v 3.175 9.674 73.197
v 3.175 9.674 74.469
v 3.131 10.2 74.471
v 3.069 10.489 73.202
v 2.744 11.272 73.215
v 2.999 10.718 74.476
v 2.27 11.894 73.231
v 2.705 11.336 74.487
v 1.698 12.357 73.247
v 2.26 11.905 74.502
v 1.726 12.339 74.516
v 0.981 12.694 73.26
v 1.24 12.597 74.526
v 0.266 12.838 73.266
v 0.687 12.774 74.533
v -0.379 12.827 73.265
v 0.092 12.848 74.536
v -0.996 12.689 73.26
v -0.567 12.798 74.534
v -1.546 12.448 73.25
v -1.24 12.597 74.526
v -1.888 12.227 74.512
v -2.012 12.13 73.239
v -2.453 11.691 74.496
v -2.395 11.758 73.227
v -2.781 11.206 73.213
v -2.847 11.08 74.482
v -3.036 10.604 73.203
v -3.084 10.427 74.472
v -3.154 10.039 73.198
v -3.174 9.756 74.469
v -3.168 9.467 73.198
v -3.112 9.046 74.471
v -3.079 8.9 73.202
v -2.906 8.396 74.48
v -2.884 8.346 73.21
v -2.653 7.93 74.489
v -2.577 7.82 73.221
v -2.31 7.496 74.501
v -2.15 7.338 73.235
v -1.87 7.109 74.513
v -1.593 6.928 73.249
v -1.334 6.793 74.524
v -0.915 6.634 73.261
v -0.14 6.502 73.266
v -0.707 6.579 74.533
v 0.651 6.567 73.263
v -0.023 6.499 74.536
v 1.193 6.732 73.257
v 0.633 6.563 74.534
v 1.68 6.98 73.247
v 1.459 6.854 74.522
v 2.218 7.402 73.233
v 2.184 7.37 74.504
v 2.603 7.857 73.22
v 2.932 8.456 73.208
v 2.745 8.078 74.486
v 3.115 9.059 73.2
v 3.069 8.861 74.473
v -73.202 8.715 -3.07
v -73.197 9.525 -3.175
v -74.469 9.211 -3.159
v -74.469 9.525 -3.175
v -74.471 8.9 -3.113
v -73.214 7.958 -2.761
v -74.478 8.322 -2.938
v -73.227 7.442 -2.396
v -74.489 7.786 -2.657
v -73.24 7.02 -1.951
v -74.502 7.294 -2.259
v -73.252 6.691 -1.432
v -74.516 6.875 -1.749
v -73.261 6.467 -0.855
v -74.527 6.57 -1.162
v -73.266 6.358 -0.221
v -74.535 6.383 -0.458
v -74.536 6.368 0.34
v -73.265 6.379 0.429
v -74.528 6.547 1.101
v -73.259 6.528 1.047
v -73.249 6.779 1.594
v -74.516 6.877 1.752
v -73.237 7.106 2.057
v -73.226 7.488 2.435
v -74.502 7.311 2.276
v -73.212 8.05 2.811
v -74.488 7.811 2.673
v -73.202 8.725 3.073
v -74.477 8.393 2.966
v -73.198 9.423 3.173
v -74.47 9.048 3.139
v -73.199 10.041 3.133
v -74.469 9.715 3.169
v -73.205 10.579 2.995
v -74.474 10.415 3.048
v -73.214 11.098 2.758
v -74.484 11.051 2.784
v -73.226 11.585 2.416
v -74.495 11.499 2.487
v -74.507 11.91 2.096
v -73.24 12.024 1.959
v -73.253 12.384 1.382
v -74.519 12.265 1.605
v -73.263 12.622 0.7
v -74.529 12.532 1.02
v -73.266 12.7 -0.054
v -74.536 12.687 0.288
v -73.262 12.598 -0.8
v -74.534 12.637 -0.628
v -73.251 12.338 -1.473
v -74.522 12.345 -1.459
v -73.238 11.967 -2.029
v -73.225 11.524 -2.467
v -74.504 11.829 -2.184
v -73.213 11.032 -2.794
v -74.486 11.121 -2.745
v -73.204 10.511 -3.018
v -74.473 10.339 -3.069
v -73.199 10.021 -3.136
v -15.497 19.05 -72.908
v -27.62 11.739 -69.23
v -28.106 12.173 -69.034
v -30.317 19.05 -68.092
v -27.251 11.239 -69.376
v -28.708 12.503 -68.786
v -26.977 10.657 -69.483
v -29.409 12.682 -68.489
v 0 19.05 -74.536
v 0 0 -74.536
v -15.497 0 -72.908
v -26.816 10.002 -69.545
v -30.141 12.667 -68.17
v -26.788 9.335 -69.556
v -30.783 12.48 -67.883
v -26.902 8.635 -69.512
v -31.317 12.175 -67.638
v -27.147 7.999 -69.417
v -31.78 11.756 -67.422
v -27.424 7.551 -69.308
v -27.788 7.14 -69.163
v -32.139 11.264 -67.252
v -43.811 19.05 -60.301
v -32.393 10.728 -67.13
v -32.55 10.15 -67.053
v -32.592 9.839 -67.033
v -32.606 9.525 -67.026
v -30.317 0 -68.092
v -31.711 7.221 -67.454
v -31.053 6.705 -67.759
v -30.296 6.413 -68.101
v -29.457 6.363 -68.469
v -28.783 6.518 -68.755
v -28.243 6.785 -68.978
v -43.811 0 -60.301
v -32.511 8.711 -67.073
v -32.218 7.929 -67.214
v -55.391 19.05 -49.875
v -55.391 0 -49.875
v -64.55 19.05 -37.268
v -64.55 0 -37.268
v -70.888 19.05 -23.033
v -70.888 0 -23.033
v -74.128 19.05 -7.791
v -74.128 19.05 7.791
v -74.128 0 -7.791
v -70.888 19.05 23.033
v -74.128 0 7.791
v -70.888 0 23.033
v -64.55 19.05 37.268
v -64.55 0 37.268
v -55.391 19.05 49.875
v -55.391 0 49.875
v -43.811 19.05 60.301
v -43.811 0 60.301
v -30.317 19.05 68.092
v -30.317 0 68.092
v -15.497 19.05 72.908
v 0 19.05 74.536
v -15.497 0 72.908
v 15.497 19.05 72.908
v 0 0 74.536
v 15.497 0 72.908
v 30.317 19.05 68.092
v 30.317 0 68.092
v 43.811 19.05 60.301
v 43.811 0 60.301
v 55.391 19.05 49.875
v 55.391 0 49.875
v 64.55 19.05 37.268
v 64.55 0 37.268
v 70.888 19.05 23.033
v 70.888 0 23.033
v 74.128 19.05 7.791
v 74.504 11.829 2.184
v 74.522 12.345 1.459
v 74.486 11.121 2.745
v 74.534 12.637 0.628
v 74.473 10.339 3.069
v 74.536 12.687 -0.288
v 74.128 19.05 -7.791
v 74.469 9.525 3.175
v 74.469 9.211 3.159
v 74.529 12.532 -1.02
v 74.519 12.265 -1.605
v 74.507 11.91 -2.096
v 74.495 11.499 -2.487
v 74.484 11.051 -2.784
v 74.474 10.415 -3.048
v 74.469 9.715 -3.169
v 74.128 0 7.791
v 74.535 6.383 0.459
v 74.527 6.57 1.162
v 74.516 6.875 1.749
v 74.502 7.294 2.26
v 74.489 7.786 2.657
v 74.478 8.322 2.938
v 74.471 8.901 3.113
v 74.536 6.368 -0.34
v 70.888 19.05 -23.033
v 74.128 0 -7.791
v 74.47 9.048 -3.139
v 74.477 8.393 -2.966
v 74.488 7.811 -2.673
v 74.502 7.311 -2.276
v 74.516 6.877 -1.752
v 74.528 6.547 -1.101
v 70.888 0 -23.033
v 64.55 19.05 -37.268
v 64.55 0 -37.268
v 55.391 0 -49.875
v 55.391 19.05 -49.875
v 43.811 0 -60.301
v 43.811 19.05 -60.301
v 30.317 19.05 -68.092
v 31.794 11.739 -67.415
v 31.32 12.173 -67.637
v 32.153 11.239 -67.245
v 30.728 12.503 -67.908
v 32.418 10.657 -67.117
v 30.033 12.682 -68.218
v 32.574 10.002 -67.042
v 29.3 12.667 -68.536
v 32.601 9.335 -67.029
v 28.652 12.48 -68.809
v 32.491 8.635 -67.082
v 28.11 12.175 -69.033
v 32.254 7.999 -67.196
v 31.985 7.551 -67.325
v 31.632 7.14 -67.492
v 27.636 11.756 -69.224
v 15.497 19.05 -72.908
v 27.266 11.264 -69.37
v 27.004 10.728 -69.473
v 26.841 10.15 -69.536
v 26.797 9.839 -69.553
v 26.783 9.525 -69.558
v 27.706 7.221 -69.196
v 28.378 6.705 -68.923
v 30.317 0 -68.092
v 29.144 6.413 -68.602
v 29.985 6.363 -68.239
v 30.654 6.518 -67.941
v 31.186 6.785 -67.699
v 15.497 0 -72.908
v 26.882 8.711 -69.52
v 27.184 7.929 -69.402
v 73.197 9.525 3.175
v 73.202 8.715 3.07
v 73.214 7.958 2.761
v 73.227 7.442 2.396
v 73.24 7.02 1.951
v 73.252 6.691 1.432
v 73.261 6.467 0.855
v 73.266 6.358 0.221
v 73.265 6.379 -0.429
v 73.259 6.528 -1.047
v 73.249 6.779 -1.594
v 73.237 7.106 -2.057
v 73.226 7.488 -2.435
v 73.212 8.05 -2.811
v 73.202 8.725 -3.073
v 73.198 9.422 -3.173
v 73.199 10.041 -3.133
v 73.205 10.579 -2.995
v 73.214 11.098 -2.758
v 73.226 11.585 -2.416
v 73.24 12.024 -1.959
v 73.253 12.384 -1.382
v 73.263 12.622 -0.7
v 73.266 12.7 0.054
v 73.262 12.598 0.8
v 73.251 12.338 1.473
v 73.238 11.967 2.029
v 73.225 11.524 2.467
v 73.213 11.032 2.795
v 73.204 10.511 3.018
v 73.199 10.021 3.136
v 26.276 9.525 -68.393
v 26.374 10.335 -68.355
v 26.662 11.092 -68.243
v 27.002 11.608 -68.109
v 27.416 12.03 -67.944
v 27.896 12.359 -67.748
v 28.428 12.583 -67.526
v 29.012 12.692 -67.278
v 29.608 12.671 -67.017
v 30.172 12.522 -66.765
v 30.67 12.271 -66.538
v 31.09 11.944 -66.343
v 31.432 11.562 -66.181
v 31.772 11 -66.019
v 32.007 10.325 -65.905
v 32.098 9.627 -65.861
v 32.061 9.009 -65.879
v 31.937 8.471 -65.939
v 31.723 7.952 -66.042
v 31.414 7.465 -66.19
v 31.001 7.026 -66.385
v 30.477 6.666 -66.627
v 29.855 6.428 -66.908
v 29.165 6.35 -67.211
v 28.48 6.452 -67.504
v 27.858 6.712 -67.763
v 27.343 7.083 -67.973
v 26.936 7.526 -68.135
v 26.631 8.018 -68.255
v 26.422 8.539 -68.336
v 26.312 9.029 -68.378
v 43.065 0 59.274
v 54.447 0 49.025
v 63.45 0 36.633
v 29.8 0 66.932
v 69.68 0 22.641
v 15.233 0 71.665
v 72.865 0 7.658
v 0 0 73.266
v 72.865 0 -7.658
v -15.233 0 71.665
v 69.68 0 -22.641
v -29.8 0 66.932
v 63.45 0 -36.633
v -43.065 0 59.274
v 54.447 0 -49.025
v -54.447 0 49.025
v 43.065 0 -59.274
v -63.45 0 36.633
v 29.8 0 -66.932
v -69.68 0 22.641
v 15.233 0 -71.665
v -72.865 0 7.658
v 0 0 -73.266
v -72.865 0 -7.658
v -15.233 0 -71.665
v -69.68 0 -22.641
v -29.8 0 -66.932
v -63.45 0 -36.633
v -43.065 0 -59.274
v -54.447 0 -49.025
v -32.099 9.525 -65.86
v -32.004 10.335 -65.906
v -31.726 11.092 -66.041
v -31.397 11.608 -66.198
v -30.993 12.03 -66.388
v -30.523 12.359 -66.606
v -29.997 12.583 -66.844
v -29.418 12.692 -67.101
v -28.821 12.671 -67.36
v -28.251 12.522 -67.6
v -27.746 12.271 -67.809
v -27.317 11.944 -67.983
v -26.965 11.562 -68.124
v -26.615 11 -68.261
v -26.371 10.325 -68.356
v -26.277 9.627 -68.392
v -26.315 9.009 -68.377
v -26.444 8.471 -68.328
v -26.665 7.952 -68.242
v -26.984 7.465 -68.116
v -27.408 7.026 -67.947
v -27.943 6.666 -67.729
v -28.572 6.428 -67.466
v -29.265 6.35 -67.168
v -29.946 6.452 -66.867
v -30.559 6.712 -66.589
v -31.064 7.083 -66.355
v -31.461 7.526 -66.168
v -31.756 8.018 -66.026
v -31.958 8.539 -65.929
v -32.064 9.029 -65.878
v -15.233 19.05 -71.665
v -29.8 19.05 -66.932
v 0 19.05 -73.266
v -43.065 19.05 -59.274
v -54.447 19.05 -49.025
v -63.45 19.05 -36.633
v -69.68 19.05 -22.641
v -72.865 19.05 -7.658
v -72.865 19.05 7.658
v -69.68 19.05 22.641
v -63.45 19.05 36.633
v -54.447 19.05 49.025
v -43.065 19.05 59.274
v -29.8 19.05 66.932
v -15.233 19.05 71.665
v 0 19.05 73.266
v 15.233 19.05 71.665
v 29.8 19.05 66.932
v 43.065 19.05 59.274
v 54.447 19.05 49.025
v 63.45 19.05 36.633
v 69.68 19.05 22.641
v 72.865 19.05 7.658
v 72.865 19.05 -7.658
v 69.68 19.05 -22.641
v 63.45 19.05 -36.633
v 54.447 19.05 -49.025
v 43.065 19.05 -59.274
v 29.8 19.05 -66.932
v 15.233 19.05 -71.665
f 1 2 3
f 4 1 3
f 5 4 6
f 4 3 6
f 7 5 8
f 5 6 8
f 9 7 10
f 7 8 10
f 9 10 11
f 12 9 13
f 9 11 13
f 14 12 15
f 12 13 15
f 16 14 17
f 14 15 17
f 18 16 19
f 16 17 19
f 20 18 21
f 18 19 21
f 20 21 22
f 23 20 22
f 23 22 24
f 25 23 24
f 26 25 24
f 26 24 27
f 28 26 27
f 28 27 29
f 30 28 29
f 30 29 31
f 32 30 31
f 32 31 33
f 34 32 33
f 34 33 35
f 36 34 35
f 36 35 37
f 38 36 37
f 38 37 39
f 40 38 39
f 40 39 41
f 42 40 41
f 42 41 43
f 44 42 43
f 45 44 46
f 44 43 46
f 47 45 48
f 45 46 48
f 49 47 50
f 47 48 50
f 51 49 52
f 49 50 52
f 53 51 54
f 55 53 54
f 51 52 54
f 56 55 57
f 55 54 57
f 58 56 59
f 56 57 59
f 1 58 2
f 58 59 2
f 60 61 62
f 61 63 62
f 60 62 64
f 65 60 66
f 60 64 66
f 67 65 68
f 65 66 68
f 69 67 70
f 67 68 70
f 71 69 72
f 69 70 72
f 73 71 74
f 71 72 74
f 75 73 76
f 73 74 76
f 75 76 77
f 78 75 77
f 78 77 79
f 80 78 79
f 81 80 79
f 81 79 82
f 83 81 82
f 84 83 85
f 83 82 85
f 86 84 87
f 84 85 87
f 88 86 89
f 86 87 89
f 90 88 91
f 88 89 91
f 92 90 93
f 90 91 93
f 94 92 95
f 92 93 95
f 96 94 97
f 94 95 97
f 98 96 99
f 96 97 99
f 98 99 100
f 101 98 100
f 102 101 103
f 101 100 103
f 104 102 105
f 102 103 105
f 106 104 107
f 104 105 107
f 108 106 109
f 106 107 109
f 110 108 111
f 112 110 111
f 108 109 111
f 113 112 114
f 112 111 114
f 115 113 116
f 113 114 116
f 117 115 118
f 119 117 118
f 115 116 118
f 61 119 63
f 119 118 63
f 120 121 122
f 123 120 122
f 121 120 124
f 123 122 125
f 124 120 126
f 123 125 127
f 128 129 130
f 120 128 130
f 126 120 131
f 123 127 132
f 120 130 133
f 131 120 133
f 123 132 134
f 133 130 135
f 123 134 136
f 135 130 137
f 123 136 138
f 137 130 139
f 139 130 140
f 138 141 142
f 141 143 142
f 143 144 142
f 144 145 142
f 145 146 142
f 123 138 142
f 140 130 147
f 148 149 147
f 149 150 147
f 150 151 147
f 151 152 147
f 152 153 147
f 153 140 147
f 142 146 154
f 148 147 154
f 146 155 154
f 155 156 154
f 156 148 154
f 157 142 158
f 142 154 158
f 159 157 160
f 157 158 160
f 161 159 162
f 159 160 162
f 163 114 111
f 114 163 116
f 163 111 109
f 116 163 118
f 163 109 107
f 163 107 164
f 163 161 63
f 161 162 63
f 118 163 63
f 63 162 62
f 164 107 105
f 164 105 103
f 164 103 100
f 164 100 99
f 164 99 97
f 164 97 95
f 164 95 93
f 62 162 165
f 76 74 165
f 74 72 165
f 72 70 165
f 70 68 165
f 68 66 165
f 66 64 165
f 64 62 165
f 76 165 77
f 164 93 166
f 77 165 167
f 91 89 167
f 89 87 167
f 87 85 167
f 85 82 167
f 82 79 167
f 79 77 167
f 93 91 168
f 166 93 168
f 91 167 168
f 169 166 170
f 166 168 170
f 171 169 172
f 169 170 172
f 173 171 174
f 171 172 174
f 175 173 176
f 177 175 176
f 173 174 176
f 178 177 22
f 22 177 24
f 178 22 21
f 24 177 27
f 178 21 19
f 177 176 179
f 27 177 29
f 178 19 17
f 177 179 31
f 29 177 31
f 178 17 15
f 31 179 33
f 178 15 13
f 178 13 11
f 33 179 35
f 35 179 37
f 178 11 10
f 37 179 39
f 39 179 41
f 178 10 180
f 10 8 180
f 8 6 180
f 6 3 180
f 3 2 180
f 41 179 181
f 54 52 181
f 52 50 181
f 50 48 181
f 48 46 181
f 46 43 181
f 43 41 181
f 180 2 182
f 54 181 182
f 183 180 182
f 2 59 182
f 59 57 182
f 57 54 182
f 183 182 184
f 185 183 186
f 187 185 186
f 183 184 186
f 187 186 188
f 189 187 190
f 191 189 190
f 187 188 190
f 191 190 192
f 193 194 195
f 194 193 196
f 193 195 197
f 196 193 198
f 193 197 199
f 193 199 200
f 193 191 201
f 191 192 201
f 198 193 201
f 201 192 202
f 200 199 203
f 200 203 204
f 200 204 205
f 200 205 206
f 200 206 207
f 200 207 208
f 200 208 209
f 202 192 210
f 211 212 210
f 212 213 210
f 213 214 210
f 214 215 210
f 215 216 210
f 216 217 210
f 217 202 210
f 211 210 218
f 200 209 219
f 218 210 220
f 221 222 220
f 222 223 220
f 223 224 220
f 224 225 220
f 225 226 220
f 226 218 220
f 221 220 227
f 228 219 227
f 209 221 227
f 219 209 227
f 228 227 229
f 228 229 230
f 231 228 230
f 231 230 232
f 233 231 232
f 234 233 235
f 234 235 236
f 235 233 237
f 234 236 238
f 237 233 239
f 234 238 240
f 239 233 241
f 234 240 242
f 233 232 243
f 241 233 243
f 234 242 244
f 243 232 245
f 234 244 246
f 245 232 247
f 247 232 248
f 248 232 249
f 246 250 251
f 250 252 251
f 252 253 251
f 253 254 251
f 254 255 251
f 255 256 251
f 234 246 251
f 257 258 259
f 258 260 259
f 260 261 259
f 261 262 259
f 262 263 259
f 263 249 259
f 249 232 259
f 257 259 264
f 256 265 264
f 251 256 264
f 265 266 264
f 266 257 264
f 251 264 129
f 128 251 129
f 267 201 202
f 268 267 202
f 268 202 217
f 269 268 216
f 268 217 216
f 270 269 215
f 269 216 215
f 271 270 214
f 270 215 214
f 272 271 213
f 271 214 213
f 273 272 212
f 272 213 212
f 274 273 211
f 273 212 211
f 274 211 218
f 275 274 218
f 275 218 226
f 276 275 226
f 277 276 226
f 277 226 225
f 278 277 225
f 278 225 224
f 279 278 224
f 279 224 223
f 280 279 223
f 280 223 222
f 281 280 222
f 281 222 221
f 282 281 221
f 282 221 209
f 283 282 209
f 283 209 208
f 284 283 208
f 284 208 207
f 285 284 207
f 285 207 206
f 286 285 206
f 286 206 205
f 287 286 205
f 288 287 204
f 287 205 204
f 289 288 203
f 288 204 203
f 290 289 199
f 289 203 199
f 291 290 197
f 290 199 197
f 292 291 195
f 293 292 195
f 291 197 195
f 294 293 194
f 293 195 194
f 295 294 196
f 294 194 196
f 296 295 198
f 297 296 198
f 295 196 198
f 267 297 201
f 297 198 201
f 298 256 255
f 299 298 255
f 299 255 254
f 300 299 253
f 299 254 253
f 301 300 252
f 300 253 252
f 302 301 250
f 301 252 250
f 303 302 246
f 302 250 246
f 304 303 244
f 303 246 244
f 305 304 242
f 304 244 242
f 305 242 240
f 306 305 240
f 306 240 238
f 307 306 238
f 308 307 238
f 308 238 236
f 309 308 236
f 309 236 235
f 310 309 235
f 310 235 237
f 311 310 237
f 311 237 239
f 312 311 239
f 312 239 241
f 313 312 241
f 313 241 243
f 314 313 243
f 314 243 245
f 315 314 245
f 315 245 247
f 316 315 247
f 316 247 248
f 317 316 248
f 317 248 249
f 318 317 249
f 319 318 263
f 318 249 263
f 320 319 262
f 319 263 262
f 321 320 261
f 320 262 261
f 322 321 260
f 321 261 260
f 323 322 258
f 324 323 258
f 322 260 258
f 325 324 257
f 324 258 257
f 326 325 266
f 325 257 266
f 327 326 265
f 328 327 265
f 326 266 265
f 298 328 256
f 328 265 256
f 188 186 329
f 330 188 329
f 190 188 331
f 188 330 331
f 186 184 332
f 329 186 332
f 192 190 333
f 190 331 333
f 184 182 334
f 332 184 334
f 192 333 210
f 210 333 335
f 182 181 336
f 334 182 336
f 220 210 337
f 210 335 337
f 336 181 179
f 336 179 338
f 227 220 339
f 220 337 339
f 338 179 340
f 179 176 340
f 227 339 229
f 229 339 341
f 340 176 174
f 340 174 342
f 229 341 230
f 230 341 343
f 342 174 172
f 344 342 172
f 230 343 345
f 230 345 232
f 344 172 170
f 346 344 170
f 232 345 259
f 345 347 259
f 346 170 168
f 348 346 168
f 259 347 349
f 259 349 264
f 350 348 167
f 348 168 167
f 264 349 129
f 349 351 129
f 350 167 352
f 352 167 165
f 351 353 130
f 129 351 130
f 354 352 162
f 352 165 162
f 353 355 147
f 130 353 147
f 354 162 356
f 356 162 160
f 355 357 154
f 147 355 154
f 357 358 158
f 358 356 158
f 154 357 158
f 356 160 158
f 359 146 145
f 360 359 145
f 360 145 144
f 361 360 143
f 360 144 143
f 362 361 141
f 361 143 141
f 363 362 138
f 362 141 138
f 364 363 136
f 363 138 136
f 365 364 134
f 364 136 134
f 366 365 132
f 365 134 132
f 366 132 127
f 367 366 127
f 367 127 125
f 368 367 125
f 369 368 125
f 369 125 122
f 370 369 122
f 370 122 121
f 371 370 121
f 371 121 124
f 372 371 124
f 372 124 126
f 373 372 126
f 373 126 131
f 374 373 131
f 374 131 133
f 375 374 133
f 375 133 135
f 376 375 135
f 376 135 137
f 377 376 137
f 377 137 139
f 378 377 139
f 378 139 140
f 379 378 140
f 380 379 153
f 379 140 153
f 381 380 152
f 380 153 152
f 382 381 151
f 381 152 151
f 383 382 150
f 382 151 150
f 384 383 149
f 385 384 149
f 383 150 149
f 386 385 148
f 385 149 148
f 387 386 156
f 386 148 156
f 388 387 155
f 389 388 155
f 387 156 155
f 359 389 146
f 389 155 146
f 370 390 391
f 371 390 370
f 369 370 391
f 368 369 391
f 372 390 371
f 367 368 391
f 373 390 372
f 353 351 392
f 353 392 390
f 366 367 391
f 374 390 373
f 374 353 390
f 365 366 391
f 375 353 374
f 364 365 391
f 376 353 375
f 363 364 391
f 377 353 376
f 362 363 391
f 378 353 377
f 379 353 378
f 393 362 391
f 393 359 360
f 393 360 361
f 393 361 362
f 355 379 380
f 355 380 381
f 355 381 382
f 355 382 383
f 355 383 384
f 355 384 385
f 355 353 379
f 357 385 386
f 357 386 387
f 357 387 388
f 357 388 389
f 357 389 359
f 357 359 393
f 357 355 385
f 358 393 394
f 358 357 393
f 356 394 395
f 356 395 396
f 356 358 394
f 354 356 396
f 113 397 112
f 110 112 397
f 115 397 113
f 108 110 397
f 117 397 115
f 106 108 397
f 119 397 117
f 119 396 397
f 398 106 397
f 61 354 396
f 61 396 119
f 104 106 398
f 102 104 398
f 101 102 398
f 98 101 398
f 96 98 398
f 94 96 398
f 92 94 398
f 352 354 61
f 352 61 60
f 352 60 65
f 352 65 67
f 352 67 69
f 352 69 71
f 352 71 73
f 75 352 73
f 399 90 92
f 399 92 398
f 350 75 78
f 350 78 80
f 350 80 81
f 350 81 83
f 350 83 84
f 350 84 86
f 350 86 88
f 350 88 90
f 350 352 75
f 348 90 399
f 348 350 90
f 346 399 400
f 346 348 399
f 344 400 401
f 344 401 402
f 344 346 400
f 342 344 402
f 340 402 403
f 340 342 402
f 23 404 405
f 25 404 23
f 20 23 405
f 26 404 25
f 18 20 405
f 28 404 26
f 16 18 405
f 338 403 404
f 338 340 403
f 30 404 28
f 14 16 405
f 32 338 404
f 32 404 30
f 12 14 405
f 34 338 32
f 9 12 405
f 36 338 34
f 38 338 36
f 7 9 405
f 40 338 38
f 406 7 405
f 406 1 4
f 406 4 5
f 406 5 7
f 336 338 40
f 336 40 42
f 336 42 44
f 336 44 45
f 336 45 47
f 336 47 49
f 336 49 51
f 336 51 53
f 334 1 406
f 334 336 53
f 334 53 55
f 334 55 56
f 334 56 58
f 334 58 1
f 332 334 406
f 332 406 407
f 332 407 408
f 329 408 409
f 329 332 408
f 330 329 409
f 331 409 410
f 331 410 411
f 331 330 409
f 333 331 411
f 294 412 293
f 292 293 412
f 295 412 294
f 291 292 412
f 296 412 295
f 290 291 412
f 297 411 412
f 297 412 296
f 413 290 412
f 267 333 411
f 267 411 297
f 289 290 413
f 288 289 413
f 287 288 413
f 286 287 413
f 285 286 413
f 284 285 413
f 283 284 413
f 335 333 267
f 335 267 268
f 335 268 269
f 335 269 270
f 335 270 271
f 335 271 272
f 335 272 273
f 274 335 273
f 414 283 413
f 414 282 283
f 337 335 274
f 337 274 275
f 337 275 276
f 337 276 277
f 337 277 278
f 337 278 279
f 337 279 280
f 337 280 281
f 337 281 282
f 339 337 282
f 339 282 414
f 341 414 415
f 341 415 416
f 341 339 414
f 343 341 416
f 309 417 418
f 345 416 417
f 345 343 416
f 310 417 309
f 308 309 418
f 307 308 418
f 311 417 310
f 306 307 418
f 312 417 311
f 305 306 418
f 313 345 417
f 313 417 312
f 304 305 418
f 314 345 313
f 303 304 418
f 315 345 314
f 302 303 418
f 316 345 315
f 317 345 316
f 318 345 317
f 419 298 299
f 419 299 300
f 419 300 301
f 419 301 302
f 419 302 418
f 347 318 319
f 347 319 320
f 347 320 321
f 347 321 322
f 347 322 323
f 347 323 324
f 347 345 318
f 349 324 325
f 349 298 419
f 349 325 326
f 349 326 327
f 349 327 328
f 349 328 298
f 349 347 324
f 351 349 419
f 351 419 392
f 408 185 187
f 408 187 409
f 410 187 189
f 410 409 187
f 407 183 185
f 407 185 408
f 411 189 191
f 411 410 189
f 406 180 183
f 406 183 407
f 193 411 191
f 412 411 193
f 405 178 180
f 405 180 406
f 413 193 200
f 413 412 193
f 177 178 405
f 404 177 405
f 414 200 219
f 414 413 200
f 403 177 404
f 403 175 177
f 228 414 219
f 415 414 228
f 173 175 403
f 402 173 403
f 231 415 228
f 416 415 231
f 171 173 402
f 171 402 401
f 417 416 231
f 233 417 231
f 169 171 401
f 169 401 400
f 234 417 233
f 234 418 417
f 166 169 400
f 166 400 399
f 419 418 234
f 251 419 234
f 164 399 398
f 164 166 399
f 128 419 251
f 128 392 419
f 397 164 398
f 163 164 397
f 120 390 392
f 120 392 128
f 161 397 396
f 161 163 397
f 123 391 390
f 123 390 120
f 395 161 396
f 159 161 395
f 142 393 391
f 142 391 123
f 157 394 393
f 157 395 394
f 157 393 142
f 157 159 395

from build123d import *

# Parameters (mm, degrees)
SKETCH1_R                                 = 74.5363
SKETCH1_R_2                               = 73.2663
BOSS_EXTRUDE1_DEPTH                       = 19.05
F_1_4_0_25_DIAMETER_HOLE1_REACH           = 179.139
F_1_4_0_25_DIAMETER_HOLE1_BORE_R          = 3.175
F_1_4_0_25_DIAMETER_HOLE1_ON_FACE_2_REACH = 179.139
F_1_4_0_25_DIAMETER_HOLE1_BORE_2_R        = 3.175
F_1_4_0_25_DIAMETER_HOLE4_REACH           = 168.94
F_1_4_0_25_DIAMETER_HOLE4_BORE_R          = 3.175
F_1_4_0_25_DIAMETER_HOLE4_ON_FACE_2_REACH = 168.949
F_1_4_0_25_DIAMETER_HOLE4_BORE_2_R        = 3.175
F_1_4_0_25_DIAMETER_HOLE4_ON_FACE_3_REACH = 168.94
F_1_4_0_25_DIAMETER_HOLE4_BORE_3_R        = 3.175


with BuildPart() as part:
    # Sketch1 → Boss-Extrude1 (new body)
    with BuildSketch(Plane(origin=(0, 0, 0), x_dir=(1, 0, 0), z_dir=(0, 1, 0))):
        with Locations(Location((0, 0, 0), (0, 0, 90))):
            Circle(SKETCH1_R)
        with Locations(Location((0, 0, 0), (0, 0, 90))):
            Circle(SKETCH1_R_2, mode=Mode.SUBTRACT)
    extrude(amount=BOSS_EXTRUDE1_DEPTH)

    # 1/4 (0.25) Diameter Hole1 bore (on position points) → 1/4 (0.25) Diameter Hole1 (cut, up to next)
    with BuildSketch(Plane(origin=(-29.721280226, 9.525, -68.354264822), x_dir=(-0.917060074385, 0, 0.398749068925), z_dir=(-0.398749068925, 0, -0.917060074385)), mode=Mode.PRIVATE) as f_1_4_0_25_diameter_hole1_sk1:
        Circle(F_1_4_0_25_DIAMETER_HOLE1_BORE_R)
    f_1_4_0_25_diameter_hole1_tool1 = extrude(f_1_4_0_25_diameter_hole1_sk1.sketch, amount=-F_1_4_0_25_DIAMETER_HOLE1_REACH, mode=Mode.PRIVATE) & part.part
    add(f_1_4_0_25_diameter_hole1_tool1.solids().sort_by_distance((-29.72128, 9.525, -68.354265))[0], mode=Mode.SUBTRACT)

    # 1/4 (0.25) Diameter Hole1 bore 2 (on position points) → 1/4 (0.25) Diameter Hole1 on face 2 (cut, up to next)
    with BuildSketch(Plane(origin=(29.721280226, 9.525, -68.354264822), x_dir=(-0.917060087762, 0, -0.39874903816), z_dir=(0.39874903816, 0, -0.917060087762)), mode=Mode.PRIVATE) as f_1_4_0_25_diameter_hole1_on_face_2_sk1:
        Circle(F_1_4_0_25_DIAMETER_HOLE1_BORE_2_R)
    f_1_4_0_25_diameter_hole1_on_face_2_tool1 = extrude(f_1_4_0_25_diameter_hole1_on_face_2_sk1.sketch, amount=-F_1_4_0_25_DIAMETER_HOLE1_ON_FACE_2_REACH, mode=Mode.PRIVATE) & part.part
    add(f_1_4_0_25_diameter_hole1_on_face_2_tool1.solids().sort_by_distance((29.72128, 9.525, -68.354265))[0], mode=Mode.SUBTRACT)

    # 1/4 (0.25) Diameter Hole4 bore (on position points) → 1/4 (0.25) Diameter Hole4 (cut, up to next)
    with BuildSketch(Plane(origin=(74.5363, 9.525, 0), x_dir=(0, 0, 1), z_dir=(1, 0, 0)), mode=Mode.PRIVATE) as f_1_4_0_25_diameter_hole4_sk1:
        Circle(F_1_4_0_25_DIAMETER_HOLE4_BORE_R)
    f_1_4_0_25_diameter_hole4_tool1 = extrude(f_1_4_0_25_diameter_hole4_sk1.sketch, amount=-F_1_4_0_25_DIAMETER_HOLE4_REACH, mode=Mode.PRIVATE) & part.part
    add(f_1_4_0_25_diameter_hole4_tool1.solids().sort_by_distance((74.5363, 9.525, 0))[0], mode=Mode.SUBTRACT)

    # 1/4 (0.25) Diameter Hole4 bore 2 (on position points) → 1/4 (0.25) Diameter Hole4 on face 2 (cut, up to next)
    with BuildSketch(Plane(origin=(0, 9.674393406, 74.5363), x_dir=(1, 0, 0), z_dir=(0, 0, 1)), mode=Mode.PRIVATE) as f_1_4_0_25_diameter_hole4_on_face_2_sk1:
        Circle(F_1_4_0_25_DIAMETER_HOLE4_BORE_2_R)
    f_1_4_0_25_diameter_hole4_on_face_2_tool1 = extrude(f_1_4_0_25_diameter_hole4_on_face_2_sk1.sketch, amount=-F_1_4_0_25_DIAMETER_HOLE4_ON_FACE_2_REACH, mode=Mode.PRIVATE) & part.part
    add(f_1_4_0_25_diameter_hole4_on_face_2_tool1.solids().sort_by_distance((0, 9.674393, 74.5363))[0], mode=Mode.SUBTRACT)

    # 1/4 (0.25) Diameter Hole4 bore 3 (on position points) → 1/4 (0.25) Diameter Hole4 on face 3 (cut, up to next)
    with BuildSketch(Plane(origin=(-74.5363, 9.525, 0), x_dir=(0, 0, -1), z_dir=(-1, 0, 0)), mode=Mode.PRIVATE) as f_1_4_0_25_diameter_hole4_on_face_3_sk1:
        Circle(F_1_4_0_25_DIAMETER_HOLE4_BORE_3_R)
    f_1_4_0_25_diameter_hole4_on_face_3_tool1 = extrude(f_1_4_0_25_diameter_hole4_on_face_3_sk1.sketch, amount=-F_1_4_0_25_DIAMETER_HOLE4_ON_FACE_3_REACH, mode=Mode.PRIVATE) & part.part
    add(f_1_4_0_25_diameter_hole4_on_face_3_tool1.solids().sort_by_distance((-74.5363, 9.525, 0))[0], mode=Mode.SUBTRACT)


solid = part.part
